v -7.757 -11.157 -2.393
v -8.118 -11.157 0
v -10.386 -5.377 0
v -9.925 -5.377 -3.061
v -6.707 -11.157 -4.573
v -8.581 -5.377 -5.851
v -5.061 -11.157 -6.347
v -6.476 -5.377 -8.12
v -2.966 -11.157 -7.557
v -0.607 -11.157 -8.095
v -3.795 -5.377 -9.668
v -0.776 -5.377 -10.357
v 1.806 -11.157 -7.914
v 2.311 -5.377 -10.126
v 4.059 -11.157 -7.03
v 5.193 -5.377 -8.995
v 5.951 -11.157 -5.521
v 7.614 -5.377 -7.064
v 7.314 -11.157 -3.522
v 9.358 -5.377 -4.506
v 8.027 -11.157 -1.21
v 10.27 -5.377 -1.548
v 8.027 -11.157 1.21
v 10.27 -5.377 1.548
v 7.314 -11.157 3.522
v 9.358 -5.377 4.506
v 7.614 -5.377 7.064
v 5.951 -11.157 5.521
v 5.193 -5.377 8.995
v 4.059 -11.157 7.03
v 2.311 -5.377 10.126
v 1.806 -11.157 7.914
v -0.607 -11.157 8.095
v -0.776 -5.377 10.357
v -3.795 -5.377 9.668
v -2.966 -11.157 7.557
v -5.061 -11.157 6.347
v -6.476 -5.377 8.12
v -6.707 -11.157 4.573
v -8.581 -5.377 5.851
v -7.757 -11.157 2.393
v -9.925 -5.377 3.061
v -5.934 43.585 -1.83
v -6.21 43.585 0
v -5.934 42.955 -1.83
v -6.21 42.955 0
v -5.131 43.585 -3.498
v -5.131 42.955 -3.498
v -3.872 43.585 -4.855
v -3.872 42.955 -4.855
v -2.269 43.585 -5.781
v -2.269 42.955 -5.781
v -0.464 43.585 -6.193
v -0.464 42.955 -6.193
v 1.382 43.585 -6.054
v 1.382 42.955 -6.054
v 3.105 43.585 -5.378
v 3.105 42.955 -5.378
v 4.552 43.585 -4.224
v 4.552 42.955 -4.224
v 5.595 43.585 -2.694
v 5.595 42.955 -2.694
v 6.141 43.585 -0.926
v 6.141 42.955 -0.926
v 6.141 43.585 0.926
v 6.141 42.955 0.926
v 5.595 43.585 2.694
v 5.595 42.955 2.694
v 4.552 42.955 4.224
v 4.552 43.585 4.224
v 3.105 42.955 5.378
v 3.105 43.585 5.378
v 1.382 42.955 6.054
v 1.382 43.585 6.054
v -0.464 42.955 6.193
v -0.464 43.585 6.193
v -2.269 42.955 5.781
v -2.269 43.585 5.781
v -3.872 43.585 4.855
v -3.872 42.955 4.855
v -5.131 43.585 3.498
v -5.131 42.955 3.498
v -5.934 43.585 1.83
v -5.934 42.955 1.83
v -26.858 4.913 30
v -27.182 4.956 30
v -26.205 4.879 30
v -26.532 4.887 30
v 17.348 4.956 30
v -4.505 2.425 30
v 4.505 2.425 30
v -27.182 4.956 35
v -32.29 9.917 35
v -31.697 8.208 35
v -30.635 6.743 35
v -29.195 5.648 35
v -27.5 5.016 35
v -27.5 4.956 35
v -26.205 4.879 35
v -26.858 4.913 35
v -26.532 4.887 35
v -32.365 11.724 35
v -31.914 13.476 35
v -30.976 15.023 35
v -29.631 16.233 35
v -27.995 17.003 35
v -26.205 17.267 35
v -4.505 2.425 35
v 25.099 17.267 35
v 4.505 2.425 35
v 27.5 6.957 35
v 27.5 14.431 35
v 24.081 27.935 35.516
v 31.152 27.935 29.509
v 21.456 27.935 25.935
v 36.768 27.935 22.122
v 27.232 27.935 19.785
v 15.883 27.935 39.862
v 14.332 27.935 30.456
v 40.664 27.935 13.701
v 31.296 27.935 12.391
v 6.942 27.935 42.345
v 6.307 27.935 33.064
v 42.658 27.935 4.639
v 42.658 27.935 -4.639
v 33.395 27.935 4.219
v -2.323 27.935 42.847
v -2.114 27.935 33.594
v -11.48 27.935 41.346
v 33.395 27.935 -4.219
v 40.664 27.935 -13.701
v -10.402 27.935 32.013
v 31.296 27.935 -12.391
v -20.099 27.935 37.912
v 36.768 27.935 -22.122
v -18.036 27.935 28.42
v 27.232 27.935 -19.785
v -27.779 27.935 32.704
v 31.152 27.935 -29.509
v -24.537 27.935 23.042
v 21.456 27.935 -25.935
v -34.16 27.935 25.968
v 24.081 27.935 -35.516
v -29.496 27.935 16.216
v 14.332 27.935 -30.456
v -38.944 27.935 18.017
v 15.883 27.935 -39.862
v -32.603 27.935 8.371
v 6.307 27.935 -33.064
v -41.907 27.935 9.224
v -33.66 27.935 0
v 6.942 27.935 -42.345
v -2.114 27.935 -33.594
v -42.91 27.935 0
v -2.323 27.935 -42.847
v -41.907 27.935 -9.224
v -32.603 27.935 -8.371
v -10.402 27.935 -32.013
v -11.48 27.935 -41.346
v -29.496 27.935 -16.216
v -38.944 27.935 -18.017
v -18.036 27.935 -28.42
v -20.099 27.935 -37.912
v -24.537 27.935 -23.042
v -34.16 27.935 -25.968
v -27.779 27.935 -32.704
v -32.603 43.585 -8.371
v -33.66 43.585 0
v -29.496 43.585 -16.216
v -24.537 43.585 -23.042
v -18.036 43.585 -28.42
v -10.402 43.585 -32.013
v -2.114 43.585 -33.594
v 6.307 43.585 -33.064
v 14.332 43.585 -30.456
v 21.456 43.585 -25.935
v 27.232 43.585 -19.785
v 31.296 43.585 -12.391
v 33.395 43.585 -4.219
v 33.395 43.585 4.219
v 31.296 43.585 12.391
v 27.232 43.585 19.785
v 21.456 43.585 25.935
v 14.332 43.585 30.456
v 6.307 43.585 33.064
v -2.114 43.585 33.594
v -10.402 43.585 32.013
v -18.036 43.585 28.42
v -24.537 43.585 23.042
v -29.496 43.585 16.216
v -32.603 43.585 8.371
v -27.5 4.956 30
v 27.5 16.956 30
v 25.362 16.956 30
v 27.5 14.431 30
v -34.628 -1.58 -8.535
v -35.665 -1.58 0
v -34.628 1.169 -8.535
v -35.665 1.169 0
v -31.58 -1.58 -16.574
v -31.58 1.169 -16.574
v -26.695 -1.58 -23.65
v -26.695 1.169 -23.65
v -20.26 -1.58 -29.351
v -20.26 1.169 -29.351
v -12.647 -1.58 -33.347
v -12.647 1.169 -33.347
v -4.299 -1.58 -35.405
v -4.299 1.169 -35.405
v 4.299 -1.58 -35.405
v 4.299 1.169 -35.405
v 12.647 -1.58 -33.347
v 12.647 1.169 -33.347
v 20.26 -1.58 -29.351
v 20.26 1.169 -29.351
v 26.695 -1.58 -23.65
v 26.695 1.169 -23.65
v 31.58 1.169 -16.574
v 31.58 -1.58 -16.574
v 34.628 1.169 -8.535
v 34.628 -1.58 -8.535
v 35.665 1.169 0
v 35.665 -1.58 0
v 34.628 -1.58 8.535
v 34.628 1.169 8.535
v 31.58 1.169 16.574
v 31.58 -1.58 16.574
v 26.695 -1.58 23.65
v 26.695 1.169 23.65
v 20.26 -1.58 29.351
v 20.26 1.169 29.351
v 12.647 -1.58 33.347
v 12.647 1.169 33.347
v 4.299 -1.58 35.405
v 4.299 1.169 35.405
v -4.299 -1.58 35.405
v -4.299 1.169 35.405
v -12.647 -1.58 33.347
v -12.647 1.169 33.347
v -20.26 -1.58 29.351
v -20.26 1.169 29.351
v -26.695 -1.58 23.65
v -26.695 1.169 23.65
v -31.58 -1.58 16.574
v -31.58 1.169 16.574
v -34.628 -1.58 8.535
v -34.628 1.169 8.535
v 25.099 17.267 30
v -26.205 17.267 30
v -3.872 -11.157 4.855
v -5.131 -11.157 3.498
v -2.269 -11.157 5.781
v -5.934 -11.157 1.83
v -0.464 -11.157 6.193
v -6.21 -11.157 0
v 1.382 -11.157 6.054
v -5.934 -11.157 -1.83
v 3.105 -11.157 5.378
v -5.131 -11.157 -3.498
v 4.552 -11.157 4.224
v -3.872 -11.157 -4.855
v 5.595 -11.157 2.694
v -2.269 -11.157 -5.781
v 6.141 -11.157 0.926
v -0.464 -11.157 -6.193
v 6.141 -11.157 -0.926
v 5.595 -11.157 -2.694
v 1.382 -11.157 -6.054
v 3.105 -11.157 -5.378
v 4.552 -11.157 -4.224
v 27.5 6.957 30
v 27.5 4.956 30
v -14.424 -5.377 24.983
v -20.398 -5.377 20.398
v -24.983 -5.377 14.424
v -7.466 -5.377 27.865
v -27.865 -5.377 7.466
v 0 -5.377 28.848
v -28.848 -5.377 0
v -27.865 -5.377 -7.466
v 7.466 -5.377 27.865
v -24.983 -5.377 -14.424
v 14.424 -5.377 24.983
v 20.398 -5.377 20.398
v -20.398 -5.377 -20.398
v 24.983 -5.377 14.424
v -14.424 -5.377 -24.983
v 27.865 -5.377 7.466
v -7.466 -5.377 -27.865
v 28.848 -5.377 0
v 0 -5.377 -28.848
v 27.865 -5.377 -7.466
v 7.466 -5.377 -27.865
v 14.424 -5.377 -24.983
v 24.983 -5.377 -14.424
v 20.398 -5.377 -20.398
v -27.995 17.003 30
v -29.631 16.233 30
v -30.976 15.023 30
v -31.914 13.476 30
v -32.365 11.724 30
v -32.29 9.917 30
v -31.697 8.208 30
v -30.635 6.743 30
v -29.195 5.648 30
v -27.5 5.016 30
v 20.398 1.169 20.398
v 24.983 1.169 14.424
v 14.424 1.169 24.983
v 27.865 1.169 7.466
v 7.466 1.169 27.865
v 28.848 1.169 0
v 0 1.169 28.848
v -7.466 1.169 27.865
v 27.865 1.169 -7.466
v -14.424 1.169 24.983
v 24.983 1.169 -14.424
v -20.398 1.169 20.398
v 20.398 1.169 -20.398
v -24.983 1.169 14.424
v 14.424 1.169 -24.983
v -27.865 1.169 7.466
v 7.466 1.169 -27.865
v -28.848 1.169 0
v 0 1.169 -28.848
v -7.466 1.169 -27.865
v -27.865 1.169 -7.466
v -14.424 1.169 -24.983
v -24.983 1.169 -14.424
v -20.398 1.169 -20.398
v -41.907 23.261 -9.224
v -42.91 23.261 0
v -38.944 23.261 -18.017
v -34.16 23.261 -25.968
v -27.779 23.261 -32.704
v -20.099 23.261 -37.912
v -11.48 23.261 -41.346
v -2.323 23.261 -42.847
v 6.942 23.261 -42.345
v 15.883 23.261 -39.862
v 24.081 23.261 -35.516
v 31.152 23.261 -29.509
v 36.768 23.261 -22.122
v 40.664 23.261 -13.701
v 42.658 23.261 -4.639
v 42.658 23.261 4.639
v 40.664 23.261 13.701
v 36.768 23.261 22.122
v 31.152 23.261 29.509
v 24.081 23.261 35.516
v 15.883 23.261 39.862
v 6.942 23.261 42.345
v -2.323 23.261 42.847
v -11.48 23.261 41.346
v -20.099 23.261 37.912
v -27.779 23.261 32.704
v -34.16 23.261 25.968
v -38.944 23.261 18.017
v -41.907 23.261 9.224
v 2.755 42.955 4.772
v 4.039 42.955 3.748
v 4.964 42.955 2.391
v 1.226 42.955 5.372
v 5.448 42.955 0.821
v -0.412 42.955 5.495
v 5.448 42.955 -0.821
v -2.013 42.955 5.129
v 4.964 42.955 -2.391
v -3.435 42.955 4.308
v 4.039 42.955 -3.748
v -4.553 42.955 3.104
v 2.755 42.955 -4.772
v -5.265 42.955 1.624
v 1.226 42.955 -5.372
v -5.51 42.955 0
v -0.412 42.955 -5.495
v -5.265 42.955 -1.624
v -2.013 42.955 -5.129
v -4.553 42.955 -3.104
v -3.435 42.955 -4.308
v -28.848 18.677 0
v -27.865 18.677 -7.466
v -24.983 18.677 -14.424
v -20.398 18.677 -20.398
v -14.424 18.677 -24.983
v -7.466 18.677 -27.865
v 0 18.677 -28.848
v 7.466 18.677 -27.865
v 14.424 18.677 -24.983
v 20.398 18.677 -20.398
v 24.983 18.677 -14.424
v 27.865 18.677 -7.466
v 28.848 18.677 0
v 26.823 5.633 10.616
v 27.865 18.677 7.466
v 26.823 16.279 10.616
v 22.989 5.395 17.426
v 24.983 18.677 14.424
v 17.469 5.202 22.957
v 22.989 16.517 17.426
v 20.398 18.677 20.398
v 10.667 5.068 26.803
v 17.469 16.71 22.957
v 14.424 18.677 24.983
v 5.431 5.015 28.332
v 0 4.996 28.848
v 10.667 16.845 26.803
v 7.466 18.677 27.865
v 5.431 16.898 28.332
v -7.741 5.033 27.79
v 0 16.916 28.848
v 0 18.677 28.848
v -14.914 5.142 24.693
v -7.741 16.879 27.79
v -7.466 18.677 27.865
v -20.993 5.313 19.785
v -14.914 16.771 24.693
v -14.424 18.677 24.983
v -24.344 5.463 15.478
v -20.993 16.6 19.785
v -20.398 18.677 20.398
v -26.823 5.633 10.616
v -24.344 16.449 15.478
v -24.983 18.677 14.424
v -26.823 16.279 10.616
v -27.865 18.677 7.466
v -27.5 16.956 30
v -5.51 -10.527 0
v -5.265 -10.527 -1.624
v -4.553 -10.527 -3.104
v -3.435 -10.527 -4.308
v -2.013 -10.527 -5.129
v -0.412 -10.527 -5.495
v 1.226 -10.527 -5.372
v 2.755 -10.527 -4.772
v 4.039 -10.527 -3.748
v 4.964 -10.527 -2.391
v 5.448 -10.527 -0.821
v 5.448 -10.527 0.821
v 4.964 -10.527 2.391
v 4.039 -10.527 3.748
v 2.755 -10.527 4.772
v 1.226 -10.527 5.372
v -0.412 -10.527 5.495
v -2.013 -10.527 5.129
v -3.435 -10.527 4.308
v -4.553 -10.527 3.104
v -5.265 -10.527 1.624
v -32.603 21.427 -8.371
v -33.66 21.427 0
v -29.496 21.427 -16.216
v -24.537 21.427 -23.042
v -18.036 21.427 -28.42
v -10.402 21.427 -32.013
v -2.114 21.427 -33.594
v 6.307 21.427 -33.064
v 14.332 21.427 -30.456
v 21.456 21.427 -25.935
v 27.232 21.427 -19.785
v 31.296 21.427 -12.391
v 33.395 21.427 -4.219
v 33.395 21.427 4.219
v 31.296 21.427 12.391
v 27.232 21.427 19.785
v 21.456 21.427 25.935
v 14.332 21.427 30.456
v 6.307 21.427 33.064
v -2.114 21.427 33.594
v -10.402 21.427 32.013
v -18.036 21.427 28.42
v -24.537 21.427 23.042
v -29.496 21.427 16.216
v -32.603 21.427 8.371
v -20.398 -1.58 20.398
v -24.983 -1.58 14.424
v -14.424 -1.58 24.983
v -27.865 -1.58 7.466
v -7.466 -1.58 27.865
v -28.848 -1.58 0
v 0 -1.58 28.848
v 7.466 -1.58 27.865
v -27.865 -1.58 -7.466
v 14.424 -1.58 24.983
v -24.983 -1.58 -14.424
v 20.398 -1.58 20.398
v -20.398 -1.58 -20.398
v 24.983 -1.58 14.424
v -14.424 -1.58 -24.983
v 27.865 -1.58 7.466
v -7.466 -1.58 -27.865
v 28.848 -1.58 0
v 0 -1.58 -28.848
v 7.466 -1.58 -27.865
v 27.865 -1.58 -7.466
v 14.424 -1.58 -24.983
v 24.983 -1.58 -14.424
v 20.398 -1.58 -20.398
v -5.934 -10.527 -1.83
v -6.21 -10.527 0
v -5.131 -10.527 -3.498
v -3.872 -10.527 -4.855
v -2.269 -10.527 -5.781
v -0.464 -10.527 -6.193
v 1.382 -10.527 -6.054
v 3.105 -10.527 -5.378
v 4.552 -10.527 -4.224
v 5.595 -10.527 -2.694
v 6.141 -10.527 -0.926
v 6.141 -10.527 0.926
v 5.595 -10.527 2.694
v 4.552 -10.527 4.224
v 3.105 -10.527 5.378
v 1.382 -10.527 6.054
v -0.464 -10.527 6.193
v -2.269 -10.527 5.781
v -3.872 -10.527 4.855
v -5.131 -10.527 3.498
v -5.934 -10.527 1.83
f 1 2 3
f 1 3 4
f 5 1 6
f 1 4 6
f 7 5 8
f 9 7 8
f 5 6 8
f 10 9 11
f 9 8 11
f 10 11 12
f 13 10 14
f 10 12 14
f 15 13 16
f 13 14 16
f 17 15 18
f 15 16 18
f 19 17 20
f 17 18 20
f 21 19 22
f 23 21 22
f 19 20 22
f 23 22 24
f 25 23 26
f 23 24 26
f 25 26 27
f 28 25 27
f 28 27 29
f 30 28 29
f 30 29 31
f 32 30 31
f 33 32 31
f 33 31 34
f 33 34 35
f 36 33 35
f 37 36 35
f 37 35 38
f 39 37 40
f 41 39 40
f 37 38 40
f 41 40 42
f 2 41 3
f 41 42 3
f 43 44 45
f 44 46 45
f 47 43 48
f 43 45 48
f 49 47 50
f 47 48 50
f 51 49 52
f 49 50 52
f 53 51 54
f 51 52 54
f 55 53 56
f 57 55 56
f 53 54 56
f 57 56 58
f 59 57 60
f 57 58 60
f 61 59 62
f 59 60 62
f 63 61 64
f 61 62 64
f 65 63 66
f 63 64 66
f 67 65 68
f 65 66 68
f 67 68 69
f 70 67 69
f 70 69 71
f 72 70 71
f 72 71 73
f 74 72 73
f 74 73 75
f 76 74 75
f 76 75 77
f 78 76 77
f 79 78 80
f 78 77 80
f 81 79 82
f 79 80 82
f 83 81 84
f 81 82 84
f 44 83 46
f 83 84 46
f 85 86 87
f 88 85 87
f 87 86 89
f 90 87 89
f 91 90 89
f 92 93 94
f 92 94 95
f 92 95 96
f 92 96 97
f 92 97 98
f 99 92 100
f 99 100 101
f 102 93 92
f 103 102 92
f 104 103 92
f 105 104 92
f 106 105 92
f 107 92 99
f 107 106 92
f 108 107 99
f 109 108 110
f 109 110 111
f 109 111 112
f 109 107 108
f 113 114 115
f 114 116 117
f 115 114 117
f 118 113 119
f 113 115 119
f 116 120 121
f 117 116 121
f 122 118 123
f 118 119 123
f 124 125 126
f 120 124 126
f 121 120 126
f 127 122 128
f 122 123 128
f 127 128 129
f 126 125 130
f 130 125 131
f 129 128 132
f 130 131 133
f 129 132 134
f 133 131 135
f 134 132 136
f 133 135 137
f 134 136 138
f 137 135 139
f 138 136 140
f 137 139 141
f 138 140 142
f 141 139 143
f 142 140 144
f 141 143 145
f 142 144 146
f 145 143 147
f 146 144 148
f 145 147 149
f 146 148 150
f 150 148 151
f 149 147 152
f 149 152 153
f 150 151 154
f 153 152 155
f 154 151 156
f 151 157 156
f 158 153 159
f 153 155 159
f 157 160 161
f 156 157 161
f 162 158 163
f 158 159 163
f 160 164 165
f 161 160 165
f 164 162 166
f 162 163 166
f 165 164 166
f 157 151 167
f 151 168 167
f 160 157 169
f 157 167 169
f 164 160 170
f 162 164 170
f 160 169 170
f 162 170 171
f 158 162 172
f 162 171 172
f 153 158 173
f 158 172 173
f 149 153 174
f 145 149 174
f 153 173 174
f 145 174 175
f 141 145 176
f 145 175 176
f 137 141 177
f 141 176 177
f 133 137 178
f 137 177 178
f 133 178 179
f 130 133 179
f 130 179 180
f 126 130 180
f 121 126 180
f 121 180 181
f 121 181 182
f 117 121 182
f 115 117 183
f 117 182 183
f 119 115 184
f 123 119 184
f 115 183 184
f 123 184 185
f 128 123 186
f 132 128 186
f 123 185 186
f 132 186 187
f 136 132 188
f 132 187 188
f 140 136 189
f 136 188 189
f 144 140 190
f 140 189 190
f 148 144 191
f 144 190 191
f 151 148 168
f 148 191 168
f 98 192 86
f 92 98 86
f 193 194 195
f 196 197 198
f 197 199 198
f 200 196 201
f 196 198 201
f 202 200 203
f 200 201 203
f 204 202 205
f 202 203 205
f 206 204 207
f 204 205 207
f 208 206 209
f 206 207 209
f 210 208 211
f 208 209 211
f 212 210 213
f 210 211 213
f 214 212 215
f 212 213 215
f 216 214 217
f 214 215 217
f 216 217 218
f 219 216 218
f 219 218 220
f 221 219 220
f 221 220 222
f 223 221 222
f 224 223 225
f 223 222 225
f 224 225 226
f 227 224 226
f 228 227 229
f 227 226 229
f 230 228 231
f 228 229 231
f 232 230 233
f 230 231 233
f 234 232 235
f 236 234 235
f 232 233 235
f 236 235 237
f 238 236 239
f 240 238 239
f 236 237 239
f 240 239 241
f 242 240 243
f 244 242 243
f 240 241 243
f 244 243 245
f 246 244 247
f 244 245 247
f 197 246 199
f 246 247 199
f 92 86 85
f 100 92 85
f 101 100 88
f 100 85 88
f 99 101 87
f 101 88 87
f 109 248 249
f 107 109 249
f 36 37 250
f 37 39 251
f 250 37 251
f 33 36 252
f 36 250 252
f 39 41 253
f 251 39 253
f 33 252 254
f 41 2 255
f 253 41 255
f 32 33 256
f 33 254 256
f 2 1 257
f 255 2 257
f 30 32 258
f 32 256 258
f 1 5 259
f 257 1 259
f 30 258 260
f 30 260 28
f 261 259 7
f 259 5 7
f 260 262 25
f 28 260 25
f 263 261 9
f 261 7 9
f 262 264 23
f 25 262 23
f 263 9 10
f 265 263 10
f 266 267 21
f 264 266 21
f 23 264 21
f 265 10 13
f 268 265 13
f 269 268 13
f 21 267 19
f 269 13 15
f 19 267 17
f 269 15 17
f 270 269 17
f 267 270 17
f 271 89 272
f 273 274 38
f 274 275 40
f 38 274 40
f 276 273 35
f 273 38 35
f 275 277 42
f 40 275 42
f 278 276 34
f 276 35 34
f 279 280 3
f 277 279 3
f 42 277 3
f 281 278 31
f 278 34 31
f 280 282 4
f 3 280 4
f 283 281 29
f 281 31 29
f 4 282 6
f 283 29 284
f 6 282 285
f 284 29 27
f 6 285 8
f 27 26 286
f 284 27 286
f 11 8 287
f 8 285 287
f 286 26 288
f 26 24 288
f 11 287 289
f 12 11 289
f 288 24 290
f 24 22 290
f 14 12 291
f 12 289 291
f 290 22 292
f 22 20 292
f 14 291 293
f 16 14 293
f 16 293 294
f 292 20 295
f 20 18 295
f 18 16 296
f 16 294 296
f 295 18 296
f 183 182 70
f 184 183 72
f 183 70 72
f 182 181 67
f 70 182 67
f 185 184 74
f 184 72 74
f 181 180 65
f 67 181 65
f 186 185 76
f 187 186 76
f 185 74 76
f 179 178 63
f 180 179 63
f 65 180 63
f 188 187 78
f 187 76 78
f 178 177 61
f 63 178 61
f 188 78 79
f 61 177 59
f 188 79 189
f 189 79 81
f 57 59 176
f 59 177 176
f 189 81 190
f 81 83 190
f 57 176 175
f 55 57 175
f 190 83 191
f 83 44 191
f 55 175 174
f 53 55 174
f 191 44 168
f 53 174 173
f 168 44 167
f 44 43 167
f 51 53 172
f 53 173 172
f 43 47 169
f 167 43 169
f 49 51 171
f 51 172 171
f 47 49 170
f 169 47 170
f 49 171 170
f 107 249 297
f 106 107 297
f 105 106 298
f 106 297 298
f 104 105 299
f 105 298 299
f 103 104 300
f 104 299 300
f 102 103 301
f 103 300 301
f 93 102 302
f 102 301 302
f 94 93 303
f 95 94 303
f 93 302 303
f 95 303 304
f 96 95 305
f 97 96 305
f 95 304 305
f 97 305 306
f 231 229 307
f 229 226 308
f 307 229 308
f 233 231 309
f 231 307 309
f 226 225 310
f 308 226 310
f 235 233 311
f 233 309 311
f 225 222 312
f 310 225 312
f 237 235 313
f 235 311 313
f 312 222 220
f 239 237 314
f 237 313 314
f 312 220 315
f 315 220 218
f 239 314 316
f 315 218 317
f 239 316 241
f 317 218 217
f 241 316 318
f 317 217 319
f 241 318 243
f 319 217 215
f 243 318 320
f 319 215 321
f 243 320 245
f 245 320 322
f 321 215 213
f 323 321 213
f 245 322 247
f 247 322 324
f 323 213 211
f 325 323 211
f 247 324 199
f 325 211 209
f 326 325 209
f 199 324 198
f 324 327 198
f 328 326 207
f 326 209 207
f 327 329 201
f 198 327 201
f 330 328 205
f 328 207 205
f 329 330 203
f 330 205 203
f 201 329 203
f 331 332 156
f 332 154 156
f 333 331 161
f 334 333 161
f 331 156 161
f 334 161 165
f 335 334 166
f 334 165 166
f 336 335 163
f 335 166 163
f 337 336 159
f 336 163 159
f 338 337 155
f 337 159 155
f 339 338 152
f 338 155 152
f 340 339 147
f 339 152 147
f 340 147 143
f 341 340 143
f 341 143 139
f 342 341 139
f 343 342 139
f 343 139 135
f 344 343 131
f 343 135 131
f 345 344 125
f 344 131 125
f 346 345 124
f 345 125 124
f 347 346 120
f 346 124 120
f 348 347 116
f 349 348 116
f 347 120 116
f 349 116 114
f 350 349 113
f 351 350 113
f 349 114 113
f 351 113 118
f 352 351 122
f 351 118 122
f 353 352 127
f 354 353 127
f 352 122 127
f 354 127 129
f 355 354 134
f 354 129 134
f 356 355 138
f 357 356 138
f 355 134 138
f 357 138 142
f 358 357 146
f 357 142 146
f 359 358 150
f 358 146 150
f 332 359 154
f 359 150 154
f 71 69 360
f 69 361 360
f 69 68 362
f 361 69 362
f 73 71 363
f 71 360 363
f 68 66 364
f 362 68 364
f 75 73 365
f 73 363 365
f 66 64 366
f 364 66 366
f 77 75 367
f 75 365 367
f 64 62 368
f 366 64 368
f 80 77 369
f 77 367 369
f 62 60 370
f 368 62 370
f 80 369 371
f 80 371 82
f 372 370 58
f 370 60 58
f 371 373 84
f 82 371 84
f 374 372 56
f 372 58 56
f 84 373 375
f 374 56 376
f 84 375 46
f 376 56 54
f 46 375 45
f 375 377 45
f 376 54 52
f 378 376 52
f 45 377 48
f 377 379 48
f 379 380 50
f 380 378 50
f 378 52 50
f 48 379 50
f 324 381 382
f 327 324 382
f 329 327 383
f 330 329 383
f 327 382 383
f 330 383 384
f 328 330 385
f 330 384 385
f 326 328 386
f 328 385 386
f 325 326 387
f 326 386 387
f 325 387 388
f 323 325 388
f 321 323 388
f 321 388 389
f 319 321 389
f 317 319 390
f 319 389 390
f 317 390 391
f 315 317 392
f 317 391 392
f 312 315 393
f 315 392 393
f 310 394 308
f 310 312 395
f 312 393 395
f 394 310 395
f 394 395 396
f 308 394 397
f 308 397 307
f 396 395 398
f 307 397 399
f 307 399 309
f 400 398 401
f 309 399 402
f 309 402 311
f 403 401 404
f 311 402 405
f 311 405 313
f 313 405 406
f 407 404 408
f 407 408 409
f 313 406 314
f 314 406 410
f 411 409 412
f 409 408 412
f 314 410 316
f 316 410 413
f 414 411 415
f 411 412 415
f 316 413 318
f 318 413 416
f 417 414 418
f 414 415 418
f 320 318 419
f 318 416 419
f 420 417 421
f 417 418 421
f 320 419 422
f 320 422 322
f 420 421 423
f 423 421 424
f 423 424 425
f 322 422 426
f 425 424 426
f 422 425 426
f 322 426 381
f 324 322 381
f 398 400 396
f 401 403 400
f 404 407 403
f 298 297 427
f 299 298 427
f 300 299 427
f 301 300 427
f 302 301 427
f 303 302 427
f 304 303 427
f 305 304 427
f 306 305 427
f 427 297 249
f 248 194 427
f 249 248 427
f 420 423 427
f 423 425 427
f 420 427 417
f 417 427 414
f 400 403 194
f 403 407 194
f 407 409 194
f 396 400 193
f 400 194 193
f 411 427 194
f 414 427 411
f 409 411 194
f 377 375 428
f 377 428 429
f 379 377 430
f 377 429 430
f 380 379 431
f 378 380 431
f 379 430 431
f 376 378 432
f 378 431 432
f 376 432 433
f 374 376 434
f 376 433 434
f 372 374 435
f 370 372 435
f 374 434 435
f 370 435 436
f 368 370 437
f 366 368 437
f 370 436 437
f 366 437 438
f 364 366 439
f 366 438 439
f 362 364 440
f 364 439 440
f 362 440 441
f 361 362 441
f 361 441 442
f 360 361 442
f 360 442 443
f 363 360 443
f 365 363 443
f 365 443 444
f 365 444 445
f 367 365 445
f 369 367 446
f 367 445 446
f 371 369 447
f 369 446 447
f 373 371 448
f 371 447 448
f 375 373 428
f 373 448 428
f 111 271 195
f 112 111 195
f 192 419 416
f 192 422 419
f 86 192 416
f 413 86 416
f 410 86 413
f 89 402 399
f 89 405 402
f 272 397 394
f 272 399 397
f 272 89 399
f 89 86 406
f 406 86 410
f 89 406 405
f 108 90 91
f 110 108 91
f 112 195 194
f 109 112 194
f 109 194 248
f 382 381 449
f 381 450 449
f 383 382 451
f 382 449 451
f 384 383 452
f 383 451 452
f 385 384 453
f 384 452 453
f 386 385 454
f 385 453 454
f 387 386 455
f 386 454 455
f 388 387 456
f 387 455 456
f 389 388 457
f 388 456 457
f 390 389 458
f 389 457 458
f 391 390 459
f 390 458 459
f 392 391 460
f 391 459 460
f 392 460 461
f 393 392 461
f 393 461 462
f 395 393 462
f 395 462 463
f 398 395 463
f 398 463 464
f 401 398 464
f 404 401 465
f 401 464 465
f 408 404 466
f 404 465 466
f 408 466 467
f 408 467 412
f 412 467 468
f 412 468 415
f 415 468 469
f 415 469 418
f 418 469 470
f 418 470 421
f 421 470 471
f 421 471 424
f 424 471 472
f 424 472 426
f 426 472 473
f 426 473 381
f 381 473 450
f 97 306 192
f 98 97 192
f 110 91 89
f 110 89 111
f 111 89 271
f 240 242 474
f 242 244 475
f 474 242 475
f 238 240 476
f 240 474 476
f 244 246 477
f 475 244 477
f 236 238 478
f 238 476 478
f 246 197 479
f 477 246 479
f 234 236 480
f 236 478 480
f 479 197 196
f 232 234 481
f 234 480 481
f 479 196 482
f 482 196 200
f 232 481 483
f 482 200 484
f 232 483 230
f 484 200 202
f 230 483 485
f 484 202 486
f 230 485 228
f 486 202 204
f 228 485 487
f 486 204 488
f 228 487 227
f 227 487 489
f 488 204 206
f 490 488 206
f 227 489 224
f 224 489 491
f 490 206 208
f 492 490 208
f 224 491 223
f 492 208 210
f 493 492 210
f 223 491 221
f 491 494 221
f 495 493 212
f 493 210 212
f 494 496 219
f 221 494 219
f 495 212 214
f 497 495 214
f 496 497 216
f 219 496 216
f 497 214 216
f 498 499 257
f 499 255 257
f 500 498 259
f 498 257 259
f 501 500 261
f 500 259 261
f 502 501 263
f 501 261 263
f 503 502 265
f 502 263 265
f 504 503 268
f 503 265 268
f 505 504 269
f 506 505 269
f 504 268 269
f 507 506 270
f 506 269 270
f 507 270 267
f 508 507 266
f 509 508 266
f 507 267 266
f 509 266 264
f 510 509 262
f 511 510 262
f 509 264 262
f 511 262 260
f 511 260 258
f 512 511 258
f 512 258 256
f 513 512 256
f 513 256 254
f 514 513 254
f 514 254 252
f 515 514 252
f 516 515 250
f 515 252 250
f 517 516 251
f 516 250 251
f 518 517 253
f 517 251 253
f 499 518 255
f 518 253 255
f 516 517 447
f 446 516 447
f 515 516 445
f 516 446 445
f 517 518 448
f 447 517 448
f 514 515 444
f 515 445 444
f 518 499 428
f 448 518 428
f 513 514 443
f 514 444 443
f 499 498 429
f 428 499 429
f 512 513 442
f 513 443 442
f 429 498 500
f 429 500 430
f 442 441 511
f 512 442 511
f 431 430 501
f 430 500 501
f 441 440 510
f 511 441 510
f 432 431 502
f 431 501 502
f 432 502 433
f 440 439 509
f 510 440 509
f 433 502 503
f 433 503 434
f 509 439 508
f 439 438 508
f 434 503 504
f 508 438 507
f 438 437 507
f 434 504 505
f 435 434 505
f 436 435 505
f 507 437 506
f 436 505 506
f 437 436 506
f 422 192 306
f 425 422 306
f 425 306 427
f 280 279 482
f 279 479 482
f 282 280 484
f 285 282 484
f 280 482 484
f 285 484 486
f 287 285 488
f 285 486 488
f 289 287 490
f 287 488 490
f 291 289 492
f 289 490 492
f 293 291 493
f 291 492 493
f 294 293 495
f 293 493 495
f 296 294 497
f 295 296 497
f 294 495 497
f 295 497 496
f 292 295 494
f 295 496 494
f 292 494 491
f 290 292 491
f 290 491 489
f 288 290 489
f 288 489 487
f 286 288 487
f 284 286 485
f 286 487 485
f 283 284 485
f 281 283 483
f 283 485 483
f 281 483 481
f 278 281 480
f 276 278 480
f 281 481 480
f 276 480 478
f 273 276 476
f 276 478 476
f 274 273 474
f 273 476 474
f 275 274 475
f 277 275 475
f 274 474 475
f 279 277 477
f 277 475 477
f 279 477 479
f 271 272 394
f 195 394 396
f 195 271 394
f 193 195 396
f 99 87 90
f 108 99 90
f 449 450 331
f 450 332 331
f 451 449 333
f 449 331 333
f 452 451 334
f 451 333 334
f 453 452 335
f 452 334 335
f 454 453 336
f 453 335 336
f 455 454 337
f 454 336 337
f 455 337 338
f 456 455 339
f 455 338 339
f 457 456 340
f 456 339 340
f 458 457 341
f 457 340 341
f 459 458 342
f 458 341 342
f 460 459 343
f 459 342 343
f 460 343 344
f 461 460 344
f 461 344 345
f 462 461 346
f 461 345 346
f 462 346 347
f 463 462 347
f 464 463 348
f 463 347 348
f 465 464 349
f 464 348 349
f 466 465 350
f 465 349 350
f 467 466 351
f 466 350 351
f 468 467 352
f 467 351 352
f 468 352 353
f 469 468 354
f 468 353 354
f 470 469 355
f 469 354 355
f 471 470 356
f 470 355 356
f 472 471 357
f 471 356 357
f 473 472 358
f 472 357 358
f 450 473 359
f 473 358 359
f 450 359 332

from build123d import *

# Parameters (mm, degrees)
BOSS_EXTRUDE1_REACH      = 97.167
BOSS_EXTRUDE1_END_RADIUS = 28.847569448
SKETCH2_W                = 55
SKETCH2_H                = 12
BOSS_EXTRUDE1_DRAFT      = -2
BOSS_EXTRUDE2_DEPTH      = 5


with BuildPart() as part:
    # Sketch1 → Revolve1 (revolve)
    with BuildSketch(Plane.XY, mode=Mode.PRIVATE) as revolve1_sk:
        Polygon((5.51, 42.955132593), (5.51, -10.526859692), (6.21, -10.526859692), (6.21, -11.156859692), (8.117657505, -11.156859692), (10.386196058, -5.377232125), (28.847569448, -5.377232125), (28.847569448, -1.58033765), (35.664678952, -1.58033765), (35.664678952, 1.169396269), (28.847569448, 1.169396269), (28.847569448, 18.677058662), (33.66, 21.427260592), (42.91, 23.261015516), (42.91, 27.935132593), (33.66, 27.935132593), (33.66, 43.585132593), (6.21, 43.585132593), (6.21, 42.955132593), align=None)
    revolve(revolve1_sk.sketch.rotate(Axis((0, 28.345538502, 0), (0, -1, 0)), 180), axis=Axis((0, 28.345538502, 0), (0, -1, 0)))

    # Boss-Extrude1: up to this cylinder (the profile starts outside it)
    boss_extrude1_end = Plane(origin=(0, 10.956247, 0), z_dir=(0, 1, 0)) * Cylinder(BOSS_EXTRUDE1_END_RADIUS, 253.029138896, mode=Mode.PRIVATE)



with BuildPart() as boss_extrude1_long_prism_1:
    # Sketch2 → Boss-Extrude1 (the long prism of profile 1, to be tilted and cut off)
    with BuildSketch(Plane.XY.offset(30)):
        with Locations((0, 10.956246724)):
            Rectangle(SKETCH2_W, SKETCH2_H)
    extrude(amount=-BOSS_EXTRUDE1_REACH)
    boss_extrude1_tool1_sides = [boss_extrude1_long_prism_1.faces().sort_by_distance(p)[0] for p in [
        (0, 16.956246724, -18.5835),
        (-27.5, 10.956246724, -18.5835),
        (0, 4.956246724, -18.5835),
        (27.5, 10.956246724, -18.5835),
    ]]
    draft(boss_extrude1_tool1_sides, Plane.XY.offset(30), BOSS_EXTRUDE1_DRAFT)  # the draft: side faces tilted about the start plane


with BuildPart() as part_1:
    add(part.part)
    boss_extrude1_tool1 = boss_extrude1_long_prism_1.part - boss_extrude1_end
    add(boss_extrude1_tool1.solids().sort_by_distance((0, 10.956247, 30))[0])

    # Sketch3 → Boss-Extrude2 (add)
    with BuildSketch(Plane.XY.offset(30)):
        with BuildLine():
            ThreePointArc((-27.18192553, 4.956246724), (-26.694955, 4.898123787), (-26.204912516, 4.878708906))
            Line((-26.204912516, 4.878708906), (-4.504702211, 2.425132726))
            Line((-4.504702211, 2.425132726), (4.504702211, 2.425132726))
            Line((4.504702211, 2.425132726), (27.5, 6.956827348))
            Line((27.5, 6.956827348), (27.5, 14.431115524))
            Line((27.5, 14.431115524), (25.099356835, 17.26707076))
            Line((25.099356835, 17.26707076), (-26.204912516, 17.26707076))
            ThreePointArc((-26.204912516, 17.26707076), (-32.364772816, 11.724041467), (-27.5, 5.01561109))
            Line((-27.5, 5.01561109), (-27.5, 4.956246724))
            Line((-27.5, 4.956246724), (-27.18192553, 4.956246724))
        make_face()
    extrude(amount=BOSS_EXTRUDE2_DEPTH)


solid = part_1.part
